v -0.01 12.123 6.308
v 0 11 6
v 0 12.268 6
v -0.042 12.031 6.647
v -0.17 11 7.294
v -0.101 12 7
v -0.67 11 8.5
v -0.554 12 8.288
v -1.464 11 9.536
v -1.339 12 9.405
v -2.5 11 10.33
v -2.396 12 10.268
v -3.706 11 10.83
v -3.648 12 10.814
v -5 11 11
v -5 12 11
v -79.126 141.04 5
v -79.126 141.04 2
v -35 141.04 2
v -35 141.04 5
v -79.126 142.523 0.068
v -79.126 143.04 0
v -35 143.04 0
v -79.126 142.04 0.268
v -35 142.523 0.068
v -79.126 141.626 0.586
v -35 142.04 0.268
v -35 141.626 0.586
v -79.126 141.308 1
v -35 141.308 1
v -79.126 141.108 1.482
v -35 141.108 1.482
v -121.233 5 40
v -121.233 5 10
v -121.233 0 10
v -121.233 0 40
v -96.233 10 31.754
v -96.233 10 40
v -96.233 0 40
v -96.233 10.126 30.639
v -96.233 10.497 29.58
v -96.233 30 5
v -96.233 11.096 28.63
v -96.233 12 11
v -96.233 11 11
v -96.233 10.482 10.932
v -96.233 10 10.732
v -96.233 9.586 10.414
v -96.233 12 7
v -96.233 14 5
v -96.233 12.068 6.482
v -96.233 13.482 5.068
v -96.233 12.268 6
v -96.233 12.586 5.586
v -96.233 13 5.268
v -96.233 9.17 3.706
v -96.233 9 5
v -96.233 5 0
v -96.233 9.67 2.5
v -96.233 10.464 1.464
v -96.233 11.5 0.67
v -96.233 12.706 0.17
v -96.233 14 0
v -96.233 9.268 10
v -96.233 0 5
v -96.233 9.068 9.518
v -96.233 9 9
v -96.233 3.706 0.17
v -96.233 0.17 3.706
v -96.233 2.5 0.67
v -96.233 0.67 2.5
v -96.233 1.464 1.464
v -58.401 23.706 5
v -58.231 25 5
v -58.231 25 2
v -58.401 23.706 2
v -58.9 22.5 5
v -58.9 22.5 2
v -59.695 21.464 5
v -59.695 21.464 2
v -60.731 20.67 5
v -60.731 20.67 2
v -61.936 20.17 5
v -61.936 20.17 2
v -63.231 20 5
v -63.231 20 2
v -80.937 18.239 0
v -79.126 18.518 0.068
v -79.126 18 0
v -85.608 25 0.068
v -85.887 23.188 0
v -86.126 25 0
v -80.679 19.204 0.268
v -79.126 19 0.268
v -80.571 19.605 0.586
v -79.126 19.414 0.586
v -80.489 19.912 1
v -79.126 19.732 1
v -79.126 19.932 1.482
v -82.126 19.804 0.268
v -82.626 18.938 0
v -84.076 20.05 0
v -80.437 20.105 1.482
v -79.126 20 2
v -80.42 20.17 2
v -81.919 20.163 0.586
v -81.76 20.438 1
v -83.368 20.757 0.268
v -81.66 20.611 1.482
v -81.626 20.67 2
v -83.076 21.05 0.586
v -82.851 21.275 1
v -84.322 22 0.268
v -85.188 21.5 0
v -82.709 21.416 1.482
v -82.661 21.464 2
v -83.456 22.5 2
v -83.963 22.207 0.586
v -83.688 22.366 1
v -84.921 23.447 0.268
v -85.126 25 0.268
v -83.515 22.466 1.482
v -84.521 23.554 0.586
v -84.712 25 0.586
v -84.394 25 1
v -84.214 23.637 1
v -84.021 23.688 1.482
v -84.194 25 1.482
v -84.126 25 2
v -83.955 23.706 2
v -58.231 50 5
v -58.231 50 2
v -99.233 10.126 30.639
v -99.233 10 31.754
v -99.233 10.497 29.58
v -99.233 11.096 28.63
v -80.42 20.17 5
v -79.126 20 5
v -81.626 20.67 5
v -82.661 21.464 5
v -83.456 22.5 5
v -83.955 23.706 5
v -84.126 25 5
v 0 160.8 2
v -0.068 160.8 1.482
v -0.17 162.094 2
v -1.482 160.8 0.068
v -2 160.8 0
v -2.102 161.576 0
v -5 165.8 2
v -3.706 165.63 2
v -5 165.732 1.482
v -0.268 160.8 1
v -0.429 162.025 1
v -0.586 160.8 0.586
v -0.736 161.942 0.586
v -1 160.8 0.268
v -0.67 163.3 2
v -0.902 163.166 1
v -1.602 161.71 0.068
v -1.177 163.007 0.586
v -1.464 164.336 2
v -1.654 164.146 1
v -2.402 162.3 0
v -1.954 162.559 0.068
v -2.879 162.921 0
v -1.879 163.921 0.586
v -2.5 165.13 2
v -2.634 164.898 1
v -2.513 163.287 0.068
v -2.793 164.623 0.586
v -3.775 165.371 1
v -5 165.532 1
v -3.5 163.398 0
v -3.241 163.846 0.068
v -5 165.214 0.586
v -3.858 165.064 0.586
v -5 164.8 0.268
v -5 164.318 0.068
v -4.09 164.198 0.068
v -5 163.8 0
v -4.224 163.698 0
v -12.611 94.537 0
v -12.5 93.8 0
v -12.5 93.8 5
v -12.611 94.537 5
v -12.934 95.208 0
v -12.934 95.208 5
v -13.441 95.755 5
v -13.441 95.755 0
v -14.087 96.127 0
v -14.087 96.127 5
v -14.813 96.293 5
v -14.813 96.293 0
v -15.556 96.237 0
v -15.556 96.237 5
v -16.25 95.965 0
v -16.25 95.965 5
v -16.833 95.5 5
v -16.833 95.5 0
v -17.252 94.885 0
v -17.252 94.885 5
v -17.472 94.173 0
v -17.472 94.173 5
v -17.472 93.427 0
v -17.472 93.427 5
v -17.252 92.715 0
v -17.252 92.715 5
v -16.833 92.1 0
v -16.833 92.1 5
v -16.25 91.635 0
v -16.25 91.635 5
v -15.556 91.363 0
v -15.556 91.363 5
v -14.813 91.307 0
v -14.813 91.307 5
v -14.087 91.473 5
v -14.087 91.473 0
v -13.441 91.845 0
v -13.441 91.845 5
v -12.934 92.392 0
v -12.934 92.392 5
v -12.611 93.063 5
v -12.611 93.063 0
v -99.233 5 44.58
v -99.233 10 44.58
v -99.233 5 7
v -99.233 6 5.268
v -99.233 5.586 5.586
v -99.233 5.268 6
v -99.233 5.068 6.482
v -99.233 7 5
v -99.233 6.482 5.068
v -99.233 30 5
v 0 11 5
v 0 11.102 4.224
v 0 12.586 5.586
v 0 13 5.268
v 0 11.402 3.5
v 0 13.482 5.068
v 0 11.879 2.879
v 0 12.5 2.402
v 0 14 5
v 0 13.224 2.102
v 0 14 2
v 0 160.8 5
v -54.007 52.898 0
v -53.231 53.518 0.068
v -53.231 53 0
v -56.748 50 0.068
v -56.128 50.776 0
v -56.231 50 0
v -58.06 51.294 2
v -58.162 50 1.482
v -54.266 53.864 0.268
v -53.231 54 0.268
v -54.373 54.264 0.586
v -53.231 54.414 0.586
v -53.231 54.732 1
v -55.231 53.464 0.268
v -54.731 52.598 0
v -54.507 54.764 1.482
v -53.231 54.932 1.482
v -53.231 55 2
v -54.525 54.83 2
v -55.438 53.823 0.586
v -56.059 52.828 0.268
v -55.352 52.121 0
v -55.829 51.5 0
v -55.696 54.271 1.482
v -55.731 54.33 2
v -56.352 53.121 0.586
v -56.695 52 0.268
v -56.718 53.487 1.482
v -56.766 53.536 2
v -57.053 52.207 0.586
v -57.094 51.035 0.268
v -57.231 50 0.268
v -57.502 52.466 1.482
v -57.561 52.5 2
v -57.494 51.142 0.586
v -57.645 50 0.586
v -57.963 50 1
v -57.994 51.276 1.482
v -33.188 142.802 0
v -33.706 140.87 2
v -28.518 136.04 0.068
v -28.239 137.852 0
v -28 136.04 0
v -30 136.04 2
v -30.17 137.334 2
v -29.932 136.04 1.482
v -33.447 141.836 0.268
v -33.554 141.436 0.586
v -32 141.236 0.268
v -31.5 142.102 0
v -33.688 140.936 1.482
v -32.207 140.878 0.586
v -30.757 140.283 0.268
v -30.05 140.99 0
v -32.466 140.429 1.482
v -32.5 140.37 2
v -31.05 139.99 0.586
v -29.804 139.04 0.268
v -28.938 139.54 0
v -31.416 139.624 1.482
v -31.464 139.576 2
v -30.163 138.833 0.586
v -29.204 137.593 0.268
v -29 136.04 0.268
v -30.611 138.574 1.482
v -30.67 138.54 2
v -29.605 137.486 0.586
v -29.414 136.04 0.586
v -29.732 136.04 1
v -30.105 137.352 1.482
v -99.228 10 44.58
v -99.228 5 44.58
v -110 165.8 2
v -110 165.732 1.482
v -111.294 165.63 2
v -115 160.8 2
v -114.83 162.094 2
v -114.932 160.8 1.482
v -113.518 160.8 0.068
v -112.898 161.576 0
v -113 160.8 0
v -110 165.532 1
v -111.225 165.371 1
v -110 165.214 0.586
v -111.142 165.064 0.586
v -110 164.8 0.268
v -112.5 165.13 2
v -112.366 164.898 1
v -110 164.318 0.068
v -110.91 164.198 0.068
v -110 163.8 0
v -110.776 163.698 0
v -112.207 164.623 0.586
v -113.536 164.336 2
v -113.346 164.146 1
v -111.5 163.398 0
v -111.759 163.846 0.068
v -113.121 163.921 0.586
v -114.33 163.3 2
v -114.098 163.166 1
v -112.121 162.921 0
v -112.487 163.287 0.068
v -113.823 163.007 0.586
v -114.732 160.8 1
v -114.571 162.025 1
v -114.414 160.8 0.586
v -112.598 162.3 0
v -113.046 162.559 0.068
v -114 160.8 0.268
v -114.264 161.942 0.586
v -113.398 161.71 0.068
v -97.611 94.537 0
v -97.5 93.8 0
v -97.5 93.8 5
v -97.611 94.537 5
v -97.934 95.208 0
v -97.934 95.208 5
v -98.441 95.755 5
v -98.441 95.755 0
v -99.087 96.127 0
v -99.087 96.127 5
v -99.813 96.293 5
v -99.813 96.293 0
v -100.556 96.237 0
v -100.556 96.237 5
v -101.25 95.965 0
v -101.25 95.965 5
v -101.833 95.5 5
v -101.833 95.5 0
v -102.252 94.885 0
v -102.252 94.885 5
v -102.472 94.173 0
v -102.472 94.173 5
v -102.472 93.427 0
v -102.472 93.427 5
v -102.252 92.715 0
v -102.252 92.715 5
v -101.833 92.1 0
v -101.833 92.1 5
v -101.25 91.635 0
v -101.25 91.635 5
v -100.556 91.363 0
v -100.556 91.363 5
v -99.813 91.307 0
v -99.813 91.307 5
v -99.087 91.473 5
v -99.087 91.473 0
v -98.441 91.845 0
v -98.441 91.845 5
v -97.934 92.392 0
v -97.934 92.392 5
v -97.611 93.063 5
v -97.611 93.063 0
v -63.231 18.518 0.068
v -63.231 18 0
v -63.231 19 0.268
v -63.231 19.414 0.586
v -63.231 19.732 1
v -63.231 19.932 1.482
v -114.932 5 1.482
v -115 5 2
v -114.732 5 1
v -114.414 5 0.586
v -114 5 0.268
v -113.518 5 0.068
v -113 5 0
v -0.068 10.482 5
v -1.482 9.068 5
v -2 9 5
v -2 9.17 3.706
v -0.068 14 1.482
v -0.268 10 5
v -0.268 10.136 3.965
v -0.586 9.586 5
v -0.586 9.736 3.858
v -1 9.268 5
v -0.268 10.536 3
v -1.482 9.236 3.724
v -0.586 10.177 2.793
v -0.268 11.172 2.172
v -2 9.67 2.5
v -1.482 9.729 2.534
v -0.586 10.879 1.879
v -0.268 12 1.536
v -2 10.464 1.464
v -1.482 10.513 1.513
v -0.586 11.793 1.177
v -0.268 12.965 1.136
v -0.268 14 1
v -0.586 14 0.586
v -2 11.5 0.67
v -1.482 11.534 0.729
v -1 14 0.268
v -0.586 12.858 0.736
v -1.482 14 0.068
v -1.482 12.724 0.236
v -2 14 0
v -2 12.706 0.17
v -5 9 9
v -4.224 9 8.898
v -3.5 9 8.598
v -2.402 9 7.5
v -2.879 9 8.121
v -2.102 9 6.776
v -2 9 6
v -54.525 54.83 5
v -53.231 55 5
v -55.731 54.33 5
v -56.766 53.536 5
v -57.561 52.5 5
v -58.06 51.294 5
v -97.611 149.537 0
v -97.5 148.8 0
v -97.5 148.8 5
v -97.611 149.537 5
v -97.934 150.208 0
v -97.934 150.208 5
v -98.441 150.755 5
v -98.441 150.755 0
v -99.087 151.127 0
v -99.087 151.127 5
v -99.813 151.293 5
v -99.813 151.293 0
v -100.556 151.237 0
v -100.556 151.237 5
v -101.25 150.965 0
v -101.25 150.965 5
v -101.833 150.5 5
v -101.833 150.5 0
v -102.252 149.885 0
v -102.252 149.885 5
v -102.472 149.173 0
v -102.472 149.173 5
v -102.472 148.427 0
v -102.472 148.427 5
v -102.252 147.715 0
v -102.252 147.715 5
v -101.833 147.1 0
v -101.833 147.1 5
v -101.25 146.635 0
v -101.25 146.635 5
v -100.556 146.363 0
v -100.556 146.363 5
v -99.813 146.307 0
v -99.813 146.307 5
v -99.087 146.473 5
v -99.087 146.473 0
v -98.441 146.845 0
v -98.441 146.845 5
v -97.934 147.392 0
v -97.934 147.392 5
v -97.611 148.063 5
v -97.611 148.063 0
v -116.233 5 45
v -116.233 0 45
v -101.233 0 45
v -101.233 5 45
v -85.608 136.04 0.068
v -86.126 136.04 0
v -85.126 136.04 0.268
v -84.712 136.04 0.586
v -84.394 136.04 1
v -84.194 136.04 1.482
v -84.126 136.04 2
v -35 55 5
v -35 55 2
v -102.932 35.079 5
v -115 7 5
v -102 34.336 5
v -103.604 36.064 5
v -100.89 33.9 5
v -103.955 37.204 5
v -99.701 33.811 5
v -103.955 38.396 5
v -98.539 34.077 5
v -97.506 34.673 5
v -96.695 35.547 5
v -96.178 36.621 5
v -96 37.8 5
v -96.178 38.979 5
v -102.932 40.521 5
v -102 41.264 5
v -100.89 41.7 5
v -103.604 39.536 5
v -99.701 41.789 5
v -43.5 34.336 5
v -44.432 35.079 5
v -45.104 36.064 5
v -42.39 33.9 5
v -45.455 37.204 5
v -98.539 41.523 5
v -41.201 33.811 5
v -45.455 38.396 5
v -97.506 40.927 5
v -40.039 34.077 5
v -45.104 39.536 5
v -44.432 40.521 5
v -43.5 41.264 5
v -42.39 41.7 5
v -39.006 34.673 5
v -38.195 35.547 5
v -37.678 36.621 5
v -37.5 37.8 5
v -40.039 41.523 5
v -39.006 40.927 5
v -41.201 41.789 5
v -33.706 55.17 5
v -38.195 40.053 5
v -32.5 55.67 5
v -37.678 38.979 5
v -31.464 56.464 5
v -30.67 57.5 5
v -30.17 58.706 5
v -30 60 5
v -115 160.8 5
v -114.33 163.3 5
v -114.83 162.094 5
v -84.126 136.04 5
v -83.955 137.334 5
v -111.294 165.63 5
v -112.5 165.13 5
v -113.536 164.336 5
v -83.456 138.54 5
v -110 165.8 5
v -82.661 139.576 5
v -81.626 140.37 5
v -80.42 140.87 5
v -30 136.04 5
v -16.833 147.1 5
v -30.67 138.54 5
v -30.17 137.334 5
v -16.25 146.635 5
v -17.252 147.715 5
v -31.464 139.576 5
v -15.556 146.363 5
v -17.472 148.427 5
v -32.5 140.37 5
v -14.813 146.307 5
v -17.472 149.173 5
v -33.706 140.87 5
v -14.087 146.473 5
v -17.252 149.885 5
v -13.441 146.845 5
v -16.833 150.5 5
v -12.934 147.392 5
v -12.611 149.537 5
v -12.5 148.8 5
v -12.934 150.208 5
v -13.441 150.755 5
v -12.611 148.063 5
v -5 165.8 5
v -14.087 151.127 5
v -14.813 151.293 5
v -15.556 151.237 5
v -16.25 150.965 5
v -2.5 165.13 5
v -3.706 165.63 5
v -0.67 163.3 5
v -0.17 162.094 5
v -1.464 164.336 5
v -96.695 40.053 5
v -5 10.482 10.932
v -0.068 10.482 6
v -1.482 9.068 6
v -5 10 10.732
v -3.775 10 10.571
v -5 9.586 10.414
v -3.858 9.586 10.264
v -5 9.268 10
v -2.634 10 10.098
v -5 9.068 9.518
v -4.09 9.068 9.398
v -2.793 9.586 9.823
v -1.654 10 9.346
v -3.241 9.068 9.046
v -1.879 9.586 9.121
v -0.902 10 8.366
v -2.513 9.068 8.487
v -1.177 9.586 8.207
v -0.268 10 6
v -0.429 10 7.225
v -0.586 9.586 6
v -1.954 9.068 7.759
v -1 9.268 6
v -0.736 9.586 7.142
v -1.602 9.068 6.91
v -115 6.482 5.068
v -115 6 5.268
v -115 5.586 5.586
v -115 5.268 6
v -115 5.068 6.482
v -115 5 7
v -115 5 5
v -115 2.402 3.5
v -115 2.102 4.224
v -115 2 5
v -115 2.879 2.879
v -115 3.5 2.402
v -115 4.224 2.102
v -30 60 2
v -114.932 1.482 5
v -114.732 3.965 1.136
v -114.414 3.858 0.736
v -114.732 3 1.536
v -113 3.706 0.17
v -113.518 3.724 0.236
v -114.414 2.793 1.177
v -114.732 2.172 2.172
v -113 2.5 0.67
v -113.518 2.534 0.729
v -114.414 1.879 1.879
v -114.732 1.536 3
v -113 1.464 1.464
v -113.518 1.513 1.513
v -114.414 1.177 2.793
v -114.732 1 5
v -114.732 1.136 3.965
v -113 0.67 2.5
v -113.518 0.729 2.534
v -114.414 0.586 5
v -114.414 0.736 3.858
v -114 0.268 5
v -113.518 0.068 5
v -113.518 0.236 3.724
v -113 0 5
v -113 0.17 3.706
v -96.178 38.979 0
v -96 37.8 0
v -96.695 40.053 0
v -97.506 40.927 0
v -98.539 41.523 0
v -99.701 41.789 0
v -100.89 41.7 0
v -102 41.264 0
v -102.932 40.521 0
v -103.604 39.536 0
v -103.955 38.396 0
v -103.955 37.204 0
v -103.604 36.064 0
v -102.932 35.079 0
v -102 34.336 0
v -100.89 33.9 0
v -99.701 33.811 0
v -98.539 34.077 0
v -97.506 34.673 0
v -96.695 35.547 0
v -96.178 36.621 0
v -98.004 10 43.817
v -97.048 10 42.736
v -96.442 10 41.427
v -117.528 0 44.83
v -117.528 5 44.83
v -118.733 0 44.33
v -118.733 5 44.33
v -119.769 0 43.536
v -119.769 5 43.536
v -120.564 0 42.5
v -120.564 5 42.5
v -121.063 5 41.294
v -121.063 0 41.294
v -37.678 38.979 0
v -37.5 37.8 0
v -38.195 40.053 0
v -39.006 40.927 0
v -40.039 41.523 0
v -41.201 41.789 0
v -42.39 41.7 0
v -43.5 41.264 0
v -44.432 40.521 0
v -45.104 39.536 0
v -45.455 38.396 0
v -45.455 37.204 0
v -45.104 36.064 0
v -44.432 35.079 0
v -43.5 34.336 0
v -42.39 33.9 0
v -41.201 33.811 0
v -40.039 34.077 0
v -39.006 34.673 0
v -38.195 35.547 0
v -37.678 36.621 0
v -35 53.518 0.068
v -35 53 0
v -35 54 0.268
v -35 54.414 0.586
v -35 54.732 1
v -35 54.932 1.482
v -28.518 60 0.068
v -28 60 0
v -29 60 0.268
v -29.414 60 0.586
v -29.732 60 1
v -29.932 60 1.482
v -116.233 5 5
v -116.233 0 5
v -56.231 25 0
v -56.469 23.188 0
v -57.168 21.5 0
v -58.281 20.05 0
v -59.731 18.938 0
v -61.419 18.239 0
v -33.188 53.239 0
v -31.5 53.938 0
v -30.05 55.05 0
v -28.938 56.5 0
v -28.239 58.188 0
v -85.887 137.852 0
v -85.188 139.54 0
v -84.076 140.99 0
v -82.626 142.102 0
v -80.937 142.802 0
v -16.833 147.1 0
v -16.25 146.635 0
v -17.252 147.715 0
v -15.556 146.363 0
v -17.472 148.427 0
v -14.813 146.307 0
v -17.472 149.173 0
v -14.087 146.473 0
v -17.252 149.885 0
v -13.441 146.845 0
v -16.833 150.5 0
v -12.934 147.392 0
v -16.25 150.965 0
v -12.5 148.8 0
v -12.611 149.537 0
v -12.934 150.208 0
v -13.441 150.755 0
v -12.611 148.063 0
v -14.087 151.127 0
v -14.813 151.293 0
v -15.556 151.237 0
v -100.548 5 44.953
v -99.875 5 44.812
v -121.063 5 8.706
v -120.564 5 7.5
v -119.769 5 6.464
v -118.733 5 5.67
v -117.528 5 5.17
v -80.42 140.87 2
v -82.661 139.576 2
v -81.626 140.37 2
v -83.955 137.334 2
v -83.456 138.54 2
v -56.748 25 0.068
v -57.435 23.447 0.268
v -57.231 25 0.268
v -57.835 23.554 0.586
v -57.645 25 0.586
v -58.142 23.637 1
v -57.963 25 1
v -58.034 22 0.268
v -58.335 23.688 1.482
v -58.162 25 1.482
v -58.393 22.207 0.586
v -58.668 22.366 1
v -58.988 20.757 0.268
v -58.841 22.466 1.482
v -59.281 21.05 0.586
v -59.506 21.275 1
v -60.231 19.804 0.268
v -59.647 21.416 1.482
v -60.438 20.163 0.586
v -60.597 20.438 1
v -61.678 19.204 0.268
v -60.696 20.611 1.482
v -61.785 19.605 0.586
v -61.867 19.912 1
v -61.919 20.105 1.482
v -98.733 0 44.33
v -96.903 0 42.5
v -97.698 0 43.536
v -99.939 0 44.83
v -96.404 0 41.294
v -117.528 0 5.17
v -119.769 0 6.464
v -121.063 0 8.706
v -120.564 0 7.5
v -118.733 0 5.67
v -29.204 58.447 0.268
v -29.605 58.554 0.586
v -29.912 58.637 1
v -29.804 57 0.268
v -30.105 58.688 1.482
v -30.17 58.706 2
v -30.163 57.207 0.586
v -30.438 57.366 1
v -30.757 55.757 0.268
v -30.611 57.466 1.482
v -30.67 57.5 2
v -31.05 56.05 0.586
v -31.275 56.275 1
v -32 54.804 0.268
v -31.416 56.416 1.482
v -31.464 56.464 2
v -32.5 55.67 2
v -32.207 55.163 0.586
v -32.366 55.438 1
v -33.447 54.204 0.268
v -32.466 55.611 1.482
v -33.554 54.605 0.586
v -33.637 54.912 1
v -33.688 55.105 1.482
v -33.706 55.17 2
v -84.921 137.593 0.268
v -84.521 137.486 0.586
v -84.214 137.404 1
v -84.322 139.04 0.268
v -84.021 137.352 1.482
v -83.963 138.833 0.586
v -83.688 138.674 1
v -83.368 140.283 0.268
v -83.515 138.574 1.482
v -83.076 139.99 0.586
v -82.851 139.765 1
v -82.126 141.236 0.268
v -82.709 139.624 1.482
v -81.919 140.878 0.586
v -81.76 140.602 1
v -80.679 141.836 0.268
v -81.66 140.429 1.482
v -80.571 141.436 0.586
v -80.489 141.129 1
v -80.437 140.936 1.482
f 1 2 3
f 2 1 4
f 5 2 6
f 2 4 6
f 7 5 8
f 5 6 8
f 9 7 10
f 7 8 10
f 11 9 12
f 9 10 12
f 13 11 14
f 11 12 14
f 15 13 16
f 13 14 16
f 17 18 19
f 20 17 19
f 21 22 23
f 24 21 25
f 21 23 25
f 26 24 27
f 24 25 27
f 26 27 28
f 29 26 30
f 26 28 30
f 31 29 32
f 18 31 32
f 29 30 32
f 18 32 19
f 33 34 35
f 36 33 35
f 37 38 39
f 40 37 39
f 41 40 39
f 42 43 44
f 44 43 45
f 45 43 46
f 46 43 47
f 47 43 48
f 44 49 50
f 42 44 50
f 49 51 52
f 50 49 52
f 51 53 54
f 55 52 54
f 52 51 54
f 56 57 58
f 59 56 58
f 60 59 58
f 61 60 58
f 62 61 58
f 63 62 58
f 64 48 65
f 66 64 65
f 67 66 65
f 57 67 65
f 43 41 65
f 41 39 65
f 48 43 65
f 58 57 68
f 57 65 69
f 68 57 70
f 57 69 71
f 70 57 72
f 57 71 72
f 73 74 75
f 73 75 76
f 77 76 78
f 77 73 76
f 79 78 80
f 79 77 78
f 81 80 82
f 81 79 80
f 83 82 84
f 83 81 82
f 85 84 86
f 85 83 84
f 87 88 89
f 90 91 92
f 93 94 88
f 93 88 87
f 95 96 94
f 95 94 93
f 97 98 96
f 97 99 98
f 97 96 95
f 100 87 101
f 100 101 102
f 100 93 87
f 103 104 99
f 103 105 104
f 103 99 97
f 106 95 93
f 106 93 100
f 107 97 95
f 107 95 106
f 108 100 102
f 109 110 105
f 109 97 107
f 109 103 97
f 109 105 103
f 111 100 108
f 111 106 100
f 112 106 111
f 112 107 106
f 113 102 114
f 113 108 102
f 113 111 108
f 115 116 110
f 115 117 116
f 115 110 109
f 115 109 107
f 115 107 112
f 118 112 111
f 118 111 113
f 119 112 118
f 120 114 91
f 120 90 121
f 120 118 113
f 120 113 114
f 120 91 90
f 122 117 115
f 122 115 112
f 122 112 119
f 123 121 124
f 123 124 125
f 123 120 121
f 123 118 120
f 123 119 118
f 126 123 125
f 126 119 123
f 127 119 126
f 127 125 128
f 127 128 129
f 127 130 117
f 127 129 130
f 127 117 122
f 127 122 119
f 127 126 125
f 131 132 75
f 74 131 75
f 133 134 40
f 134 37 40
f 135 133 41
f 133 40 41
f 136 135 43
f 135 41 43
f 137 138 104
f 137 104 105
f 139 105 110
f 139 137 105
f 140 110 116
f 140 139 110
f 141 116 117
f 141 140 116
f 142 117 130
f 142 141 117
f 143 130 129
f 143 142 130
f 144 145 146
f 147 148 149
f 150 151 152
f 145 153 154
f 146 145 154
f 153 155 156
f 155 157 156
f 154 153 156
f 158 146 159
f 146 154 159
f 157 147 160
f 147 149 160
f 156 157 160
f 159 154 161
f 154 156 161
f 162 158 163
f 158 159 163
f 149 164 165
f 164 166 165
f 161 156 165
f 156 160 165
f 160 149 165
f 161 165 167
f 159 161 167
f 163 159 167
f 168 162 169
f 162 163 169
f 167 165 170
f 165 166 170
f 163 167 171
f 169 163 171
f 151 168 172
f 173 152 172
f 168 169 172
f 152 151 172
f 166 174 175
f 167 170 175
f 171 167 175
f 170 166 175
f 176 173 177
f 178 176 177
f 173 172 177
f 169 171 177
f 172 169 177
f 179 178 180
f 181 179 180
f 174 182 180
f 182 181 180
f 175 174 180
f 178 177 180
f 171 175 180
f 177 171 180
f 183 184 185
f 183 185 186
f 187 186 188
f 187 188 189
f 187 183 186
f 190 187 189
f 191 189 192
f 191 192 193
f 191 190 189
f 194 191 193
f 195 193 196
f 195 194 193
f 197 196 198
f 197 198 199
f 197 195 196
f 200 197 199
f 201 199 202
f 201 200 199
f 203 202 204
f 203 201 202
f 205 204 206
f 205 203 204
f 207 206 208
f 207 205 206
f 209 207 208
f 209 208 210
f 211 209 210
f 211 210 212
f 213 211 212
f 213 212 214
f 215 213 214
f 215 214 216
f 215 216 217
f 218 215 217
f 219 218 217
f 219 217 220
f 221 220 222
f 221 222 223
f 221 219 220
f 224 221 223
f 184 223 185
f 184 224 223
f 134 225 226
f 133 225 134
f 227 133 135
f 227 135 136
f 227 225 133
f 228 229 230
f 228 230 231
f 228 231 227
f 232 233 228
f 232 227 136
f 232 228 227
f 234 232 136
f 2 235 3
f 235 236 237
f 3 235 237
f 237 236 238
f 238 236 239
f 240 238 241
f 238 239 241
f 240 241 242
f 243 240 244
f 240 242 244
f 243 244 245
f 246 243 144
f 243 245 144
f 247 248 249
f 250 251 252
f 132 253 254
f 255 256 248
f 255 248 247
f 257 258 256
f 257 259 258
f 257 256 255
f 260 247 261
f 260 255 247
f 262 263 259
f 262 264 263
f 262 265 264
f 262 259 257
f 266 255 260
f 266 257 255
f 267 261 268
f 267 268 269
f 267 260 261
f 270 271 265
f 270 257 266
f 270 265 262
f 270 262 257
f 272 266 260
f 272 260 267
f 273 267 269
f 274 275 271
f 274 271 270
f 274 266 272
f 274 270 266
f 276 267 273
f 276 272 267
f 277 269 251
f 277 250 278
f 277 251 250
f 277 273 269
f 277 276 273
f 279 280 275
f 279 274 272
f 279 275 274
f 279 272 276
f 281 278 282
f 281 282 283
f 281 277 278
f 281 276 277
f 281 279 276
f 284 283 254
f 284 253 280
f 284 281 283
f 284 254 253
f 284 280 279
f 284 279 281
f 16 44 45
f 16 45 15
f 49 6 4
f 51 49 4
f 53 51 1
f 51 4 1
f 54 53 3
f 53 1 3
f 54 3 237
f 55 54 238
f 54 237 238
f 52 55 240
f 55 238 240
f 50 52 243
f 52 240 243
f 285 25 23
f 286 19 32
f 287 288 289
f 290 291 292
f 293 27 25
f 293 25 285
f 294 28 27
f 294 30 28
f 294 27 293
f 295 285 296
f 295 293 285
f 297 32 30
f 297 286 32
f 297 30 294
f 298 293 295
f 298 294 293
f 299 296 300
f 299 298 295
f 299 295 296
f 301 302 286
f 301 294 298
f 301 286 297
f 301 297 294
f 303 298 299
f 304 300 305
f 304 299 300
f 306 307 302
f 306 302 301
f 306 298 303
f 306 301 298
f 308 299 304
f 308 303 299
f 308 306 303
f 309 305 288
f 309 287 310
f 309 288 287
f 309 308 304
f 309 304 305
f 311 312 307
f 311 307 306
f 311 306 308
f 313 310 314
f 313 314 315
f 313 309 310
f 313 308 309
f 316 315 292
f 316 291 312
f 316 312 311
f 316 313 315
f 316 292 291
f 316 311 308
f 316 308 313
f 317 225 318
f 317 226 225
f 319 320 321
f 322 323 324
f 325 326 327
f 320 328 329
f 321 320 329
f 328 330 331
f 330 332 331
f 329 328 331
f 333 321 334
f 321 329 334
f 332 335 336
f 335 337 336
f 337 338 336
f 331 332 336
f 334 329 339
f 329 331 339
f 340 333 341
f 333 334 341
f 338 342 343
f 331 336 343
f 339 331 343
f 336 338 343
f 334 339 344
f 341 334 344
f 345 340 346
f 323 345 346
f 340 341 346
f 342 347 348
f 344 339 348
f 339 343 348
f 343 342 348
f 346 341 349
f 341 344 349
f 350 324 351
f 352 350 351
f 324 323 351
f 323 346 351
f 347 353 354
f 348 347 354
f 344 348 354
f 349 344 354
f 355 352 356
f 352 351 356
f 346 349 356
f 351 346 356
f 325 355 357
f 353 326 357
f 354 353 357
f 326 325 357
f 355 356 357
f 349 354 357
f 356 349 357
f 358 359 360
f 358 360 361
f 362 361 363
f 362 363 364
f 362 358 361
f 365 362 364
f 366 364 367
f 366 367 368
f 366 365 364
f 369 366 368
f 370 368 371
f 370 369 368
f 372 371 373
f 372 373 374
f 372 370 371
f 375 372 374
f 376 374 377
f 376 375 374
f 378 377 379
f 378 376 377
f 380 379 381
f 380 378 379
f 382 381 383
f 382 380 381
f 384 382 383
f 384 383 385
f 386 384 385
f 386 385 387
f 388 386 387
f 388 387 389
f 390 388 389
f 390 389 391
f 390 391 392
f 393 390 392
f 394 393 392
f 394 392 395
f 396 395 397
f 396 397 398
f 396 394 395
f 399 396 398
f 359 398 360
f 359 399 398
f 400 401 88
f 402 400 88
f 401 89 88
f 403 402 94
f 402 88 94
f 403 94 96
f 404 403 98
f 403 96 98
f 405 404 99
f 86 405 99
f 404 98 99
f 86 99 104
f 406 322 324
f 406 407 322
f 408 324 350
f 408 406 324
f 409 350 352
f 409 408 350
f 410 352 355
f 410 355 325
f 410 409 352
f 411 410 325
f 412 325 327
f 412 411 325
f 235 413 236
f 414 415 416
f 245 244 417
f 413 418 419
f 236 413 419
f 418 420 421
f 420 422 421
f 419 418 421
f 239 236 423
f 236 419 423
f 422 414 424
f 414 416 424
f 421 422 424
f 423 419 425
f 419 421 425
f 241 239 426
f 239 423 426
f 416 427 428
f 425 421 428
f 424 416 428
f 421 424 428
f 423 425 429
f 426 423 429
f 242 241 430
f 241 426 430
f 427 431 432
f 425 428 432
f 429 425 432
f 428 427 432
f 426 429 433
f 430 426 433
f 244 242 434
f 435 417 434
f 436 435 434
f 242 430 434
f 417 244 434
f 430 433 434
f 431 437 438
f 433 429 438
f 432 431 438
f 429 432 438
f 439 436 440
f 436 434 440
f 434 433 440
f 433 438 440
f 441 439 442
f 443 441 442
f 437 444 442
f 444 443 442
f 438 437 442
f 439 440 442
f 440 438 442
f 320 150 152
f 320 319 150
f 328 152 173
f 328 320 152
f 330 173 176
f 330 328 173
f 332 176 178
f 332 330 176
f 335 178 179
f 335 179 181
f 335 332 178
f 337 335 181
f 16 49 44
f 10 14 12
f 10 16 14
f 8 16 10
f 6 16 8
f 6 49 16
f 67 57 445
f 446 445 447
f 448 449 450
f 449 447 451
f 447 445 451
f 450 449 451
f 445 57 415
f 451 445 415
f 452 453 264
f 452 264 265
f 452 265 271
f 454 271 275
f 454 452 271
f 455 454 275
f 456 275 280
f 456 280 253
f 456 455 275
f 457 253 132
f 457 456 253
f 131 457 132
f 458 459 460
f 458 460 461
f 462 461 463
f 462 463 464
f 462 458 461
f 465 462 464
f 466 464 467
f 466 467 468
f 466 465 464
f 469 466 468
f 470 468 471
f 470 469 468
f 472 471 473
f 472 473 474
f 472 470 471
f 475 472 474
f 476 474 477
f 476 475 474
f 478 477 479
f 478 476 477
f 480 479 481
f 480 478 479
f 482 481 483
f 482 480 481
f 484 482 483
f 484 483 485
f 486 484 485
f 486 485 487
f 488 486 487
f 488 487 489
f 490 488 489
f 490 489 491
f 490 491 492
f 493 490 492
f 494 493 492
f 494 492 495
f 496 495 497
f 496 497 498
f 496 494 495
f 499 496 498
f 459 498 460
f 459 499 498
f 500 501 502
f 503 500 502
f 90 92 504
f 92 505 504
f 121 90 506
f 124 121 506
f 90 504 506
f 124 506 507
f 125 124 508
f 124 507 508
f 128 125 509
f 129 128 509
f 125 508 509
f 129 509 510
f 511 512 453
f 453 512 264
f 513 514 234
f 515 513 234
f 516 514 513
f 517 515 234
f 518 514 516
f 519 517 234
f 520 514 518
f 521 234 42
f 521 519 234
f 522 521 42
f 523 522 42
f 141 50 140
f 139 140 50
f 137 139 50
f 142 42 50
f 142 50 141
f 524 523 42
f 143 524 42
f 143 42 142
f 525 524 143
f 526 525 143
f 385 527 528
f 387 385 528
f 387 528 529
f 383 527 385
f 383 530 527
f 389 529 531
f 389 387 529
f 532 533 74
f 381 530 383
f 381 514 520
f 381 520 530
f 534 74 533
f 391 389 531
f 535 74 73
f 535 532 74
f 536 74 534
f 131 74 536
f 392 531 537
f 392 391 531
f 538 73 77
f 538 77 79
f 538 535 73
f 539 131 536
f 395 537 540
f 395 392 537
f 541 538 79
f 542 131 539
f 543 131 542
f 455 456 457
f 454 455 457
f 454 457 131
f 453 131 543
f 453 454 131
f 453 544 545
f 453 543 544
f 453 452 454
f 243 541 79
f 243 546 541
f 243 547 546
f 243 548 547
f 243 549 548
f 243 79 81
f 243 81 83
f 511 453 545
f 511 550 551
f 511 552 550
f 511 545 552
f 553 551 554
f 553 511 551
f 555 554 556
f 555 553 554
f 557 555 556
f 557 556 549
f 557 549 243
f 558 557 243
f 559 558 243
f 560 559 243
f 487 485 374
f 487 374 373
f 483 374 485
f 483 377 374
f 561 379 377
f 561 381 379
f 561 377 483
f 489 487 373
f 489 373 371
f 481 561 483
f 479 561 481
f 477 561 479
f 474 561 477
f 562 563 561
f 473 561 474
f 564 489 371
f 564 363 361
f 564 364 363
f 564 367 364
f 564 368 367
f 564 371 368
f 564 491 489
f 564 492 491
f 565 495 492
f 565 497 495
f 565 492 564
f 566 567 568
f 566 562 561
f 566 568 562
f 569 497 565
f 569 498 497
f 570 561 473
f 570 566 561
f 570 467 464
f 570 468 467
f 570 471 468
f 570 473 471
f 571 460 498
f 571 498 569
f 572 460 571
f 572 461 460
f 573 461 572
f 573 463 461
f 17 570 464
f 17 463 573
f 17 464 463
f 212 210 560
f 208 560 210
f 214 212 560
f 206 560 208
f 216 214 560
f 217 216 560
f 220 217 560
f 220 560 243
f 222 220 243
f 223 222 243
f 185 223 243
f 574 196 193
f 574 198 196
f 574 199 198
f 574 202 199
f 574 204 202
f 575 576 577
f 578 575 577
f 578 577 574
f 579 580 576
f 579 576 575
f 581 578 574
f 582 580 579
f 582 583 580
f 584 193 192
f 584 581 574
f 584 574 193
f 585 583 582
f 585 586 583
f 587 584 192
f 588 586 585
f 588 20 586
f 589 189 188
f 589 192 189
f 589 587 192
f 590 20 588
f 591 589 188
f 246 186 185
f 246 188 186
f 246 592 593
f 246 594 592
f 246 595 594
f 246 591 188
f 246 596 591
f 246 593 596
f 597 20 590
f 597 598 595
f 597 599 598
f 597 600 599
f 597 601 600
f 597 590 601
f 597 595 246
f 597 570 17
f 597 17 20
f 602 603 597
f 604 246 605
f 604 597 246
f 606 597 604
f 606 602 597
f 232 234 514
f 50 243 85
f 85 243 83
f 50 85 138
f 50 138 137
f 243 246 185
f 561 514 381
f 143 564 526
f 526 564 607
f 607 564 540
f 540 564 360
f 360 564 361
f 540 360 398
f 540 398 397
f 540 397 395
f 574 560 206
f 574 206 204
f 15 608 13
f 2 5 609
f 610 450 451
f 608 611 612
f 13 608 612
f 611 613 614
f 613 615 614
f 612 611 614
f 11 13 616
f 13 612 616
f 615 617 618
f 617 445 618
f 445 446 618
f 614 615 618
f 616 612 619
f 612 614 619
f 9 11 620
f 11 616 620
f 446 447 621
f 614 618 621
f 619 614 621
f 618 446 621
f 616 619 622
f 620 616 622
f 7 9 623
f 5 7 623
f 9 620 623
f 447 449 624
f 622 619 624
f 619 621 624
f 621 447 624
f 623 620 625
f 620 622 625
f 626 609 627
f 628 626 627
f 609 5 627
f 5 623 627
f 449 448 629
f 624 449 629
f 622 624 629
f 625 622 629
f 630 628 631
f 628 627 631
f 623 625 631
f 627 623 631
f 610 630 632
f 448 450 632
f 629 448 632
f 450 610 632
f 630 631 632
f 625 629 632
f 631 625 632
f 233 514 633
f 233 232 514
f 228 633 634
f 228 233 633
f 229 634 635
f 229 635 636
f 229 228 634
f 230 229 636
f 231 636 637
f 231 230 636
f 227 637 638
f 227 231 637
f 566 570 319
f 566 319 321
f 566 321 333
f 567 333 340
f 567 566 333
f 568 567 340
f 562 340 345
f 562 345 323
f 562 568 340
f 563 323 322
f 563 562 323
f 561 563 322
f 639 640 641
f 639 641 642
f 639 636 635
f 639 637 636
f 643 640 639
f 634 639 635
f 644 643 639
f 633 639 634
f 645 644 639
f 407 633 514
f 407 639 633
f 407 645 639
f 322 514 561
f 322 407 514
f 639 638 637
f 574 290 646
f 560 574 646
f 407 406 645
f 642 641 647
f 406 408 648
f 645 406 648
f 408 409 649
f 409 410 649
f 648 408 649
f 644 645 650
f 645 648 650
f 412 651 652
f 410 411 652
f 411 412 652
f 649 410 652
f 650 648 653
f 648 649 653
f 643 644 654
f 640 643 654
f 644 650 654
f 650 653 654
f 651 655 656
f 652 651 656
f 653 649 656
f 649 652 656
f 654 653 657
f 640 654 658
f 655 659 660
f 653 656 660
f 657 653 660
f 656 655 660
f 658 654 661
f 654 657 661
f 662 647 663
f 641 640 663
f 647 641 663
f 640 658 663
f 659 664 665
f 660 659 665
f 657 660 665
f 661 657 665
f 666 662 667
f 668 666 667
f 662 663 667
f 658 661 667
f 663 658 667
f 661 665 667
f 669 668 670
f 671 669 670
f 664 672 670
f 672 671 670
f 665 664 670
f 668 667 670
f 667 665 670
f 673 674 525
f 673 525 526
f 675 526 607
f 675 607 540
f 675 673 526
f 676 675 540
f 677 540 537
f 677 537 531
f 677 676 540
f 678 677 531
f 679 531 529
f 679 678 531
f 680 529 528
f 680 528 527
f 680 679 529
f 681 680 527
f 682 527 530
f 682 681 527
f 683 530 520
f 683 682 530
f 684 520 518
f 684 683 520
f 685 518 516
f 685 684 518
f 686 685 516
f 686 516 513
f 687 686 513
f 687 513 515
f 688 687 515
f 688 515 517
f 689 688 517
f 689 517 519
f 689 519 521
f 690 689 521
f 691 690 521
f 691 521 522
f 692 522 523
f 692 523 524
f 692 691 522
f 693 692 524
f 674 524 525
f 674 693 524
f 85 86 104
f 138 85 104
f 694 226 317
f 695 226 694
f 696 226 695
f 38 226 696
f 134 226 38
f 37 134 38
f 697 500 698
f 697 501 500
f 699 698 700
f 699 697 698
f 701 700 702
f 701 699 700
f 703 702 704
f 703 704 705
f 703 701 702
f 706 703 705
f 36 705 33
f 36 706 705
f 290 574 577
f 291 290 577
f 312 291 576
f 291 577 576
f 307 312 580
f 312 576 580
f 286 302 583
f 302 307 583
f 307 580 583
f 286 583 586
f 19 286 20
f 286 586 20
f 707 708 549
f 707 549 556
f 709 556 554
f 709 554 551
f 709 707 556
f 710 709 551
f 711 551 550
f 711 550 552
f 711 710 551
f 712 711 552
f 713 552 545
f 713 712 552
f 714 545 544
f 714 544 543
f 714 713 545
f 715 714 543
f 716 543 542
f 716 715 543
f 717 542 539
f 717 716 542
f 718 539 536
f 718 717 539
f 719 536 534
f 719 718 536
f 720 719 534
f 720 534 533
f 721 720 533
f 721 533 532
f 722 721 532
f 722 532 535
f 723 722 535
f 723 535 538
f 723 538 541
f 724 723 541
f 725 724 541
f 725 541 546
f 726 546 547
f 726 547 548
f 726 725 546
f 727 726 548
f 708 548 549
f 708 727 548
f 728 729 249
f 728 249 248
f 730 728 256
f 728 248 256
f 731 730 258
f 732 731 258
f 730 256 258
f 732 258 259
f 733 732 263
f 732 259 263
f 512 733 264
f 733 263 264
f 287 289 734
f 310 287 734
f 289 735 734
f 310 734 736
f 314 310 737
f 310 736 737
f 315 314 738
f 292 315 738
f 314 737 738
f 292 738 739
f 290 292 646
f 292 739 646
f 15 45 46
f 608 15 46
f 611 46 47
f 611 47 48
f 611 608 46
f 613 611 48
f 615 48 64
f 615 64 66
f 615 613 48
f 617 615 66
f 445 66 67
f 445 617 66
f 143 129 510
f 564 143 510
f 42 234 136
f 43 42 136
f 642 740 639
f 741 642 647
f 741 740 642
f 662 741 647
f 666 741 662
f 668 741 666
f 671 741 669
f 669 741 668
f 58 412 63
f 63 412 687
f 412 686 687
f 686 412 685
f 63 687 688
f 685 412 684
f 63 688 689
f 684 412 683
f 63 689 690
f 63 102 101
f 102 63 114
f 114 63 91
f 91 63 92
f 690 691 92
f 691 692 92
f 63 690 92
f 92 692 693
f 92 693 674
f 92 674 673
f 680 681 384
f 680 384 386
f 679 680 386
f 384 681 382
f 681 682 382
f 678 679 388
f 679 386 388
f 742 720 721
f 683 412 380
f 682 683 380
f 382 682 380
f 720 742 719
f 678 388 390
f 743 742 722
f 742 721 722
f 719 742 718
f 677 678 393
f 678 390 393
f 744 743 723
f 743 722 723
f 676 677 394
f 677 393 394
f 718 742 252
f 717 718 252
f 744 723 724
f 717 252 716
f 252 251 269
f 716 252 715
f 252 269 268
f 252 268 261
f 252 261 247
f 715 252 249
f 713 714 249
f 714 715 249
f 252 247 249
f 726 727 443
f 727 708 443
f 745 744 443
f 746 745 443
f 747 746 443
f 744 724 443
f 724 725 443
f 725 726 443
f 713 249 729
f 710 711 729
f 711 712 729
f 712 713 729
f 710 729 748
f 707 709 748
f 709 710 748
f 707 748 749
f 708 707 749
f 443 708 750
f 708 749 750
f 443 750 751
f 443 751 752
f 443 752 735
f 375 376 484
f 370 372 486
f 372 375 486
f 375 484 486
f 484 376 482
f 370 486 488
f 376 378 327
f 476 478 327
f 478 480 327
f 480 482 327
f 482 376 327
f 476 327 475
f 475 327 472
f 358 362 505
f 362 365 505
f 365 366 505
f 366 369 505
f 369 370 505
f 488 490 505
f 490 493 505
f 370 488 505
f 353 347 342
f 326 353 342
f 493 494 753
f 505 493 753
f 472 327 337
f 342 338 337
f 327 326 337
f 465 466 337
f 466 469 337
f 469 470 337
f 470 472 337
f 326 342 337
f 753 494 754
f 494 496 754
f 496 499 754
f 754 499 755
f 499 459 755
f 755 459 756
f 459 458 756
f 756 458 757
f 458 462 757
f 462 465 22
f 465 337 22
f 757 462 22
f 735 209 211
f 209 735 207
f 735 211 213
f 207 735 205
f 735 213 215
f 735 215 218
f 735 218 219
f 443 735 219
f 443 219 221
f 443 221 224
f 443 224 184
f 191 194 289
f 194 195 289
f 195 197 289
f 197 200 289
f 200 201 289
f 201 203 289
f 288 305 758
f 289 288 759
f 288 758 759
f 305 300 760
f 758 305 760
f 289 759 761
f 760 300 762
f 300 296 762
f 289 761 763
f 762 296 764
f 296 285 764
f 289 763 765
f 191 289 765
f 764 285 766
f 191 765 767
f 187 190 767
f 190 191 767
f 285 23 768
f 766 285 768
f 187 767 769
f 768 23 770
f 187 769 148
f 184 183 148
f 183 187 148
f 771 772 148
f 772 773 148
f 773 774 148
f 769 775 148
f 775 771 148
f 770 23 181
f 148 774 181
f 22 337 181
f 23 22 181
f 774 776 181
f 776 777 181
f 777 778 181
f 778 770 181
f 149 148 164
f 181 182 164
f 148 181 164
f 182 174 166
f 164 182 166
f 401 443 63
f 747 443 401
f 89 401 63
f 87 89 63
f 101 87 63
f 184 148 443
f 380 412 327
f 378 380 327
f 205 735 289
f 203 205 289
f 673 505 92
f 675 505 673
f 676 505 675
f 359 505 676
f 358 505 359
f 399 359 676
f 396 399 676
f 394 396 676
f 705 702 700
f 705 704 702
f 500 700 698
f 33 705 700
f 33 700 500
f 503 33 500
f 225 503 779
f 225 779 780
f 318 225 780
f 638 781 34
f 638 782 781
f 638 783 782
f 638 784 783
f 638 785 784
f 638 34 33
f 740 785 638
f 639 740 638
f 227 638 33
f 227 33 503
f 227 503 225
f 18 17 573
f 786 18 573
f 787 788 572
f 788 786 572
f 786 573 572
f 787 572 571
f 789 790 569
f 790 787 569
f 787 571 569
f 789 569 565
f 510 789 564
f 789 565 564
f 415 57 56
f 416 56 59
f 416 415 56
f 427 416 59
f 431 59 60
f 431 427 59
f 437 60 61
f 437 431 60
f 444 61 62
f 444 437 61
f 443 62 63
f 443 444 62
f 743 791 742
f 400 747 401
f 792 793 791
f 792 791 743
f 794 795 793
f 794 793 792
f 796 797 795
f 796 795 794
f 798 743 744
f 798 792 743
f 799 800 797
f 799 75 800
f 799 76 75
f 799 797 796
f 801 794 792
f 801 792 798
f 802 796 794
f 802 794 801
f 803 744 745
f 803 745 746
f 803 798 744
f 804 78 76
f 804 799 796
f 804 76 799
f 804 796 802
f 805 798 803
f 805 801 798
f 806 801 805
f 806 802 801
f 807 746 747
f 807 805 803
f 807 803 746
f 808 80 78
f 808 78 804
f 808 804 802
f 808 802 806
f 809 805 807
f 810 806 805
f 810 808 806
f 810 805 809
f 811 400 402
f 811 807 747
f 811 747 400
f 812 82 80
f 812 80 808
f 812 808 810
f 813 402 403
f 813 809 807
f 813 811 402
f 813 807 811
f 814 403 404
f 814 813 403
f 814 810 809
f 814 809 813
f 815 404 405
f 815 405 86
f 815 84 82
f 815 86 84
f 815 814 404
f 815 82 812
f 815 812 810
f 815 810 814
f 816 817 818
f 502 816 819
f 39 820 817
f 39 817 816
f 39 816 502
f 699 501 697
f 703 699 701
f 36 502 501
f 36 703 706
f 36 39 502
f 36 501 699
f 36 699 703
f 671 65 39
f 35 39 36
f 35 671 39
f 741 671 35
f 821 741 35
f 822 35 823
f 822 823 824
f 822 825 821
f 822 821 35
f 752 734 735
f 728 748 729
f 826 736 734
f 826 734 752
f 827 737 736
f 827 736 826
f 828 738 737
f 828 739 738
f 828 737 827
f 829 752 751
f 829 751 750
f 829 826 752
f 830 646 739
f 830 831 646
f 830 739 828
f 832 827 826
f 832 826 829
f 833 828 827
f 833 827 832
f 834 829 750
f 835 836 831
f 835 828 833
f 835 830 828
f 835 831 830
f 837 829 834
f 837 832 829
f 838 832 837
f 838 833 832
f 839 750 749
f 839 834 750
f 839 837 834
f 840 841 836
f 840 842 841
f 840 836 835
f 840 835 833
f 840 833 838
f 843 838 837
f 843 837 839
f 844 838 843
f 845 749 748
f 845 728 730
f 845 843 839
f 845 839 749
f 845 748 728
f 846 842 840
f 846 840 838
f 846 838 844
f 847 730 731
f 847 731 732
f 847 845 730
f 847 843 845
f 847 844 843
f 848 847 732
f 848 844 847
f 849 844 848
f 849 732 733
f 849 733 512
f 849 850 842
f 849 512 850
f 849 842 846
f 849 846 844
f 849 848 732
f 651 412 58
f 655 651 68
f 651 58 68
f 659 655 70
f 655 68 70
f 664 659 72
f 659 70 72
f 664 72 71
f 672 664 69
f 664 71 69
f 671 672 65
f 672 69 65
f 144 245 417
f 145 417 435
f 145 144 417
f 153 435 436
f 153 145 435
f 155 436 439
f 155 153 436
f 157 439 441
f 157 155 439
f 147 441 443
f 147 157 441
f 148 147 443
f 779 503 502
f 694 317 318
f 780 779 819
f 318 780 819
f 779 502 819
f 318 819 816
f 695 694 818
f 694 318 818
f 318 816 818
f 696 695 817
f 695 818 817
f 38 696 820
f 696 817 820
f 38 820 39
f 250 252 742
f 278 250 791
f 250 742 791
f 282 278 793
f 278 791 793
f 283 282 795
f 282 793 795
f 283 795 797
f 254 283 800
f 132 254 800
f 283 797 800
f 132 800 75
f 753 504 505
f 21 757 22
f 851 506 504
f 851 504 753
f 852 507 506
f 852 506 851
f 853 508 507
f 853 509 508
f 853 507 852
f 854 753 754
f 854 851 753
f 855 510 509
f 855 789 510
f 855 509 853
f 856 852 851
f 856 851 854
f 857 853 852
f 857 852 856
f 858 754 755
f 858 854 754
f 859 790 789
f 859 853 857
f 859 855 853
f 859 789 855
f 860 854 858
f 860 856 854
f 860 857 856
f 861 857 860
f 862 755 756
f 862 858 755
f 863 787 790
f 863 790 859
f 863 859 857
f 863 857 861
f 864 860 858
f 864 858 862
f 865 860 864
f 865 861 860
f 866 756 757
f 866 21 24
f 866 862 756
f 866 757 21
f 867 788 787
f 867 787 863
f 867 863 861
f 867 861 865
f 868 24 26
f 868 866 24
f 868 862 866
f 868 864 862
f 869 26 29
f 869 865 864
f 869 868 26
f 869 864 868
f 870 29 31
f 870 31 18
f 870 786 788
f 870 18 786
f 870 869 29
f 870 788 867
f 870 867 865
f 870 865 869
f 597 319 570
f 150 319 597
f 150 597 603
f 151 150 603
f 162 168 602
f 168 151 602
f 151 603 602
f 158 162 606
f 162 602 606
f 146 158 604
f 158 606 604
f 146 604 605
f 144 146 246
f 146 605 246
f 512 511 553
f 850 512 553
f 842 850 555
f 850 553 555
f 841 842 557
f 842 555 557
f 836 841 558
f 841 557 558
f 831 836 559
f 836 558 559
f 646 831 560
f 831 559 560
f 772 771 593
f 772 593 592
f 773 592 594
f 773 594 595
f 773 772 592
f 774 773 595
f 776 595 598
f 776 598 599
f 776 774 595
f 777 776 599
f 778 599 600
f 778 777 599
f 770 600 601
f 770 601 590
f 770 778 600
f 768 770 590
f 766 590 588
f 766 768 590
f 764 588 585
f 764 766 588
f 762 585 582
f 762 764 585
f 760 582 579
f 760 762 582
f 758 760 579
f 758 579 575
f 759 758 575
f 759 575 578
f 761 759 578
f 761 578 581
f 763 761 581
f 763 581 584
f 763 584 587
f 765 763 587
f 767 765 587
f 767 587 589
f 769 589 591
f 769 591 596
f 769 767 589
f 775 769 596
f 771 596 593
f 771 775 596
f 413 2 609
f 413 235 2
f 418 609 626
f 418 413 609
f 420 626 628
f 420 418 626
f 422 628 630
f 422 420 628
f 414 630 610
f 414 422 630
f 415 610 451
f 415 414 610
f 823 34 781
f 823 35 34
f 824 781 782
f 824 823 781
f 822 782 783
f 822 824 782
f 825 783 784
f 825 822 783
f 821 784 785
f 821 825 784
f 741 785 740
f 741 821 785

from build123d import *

# Parameters (mm, degrees)
F0_W      = 115
F0_H      = 165.8
F0_R      = 4
F0_R_2    = 2.5
F1_DEPTH  = 5
F2_W      = 18.7665516138
F2_H      = 5
F2_W_2    = 6.2334483862
F3_DEPTH  = 40
F4_W      = 3
F4_H      = 25
F5_DEPTH  = 25
F9_W      = 3
F9_H      = 5
F10_DEPTH = 14.58
F12_DEPTH = 3
F13_W     = 96.2334483862
F13_H     = 9
F14_DEPTH = 5
F15_W     = 96.2334483862
F15_H     = 3
F16_DEPTH = 6
F17_R     = 5
F18_R     = 2


with BuildPart() as f1:
    # F0 (on Top) → F1 (new body)
    with BuildSketch(Plane.XY):
        with Locations((-57.5, 82.9)):
            Rectangle(F0_W, F0_H)
        with Locations((-100, 37.8)):
            Circle(F0_R, mode=Mode.SUBTRACT)
        with Locations((-41.5, 37.8)):
            Circle(F0_R, mode=Mode.SUBTRACT)
        Polygon((-84.125764668, 141.0401467979), (-30, 141.0401467979), (-30, 55), (-58.2305043936, 55), (-58.2305043936, 20), (-84.125764668, 20), align=None, mode=Mode.SUBTRACT)
        with Locations((-100, 93.8)):
            Circle(F0_R_2, mode=Mode.SUBTRACT)
        with Locations((-100, 148.8)):
            Circle(F0_R_2, mode=Mode.SUBTRACT)
        with Locations((-15, 93.8)):
            Circle(F0_R_2, mode=Mode.SUBTRACT)
        with Locations((-15, 148.8)):
            Circle(F0_R_2, mode=Mode.SUBTRACT)
    extrude(amount=-F1_DEPTH)

    # F2 (on face) → F3 (join)
    with BuildSketch(Plane(origin=(0, 0, -5), x_dir=(1, 0, 0), z_dir=(0, 0, -1))):
        with Locations((-105.6167241931, -2.5)):
            Rectangle(F2_W, F2_H)
        with Locations((-118.1167241931, -2.5)):
            Rectangle(F2_W_2, F2_H)
    extrude(amount=F3_DEPTH)

    # F4 (on face) → F5 (join)
    with BuildSketch(Plane(origin=(0, 5, 0), x_dir=(-1, 0, 0), z_dir=(0, 1, 0))):
        with Locations((97.7334483862, -17.5)):
            Rectangle(F4_W, F4_H)
    extrude(amount=F5_DEPTH)


with BuildPart() as f7_1:
    # F7: instance of F1
    add(f1.part.mirror(Plane.XY))

    # F9 (on face) → F10 (join)
    with BuildSketch(Plane.XY.offset(30)):
        with Locations((-97.7334483862, 7.5)):
            Rectangle(F9_W, F9_H)
    extrude(amount=F10_DEPTH)

    # F11 (on face) → F12 (cut, through all)
    with BuildSketch(Plane(origin=(-99.2334483862, 0, 0), x_dir=(0, -1, 0), z_dir=(-1, 0, 0))):
        Polygon((-30, 30), (-30, 5), (-10, 30), align=None)
    extrude(amount=-F12_DEPTH, mode=Mode.SUBTRACT)

    # F13 (on face) → F14 (cut, through all)
    with BuildSketch(Plane.XY.offset(5)):
        with Locations((-48.1167241931, 4.5)):
            Rectangle(F13_W, F13_H)
    extrude(amount=-F14_DEPTH, mode=Mode.SUBTRACT)

    # F15 (on face) → F16 (join)
    with BuildSketch(Plane.XY.offset(5)):
        with Locations((-48.1167241931, 10.5)):
            Rectangle(F15_W, F15_H)
    extrude(amount=F16_DEPTH)

    # F17
    f17_edges = [f7_1.edges().sort_by_distance(p)[0] for p in [
        (-97.733448, 10, 30),
        (-105.616724, 0, 0),
        (-96.233448, 2.5, 45),
        (-121.233448, 2.5, 45),
        (-121.233448, 2.5, 5),
        (-115, 165.8, 2.5),
        (0, 165.8, 2.5),
        (0, 10.5, 11),
        (-58.230504, 55, 2.5),
        (-30, 55, 2.5),
        (-58.230504, 20, 2.5),
        (-84.125765, 20, 2.5),
        (-30, 141.040147, 2.5),
        (-84.125765, 141.040147, 2.5),
        (-48.116724, 9, 0),
    ]]
    fillet(f17_edges, radius=F17_R)

    # F18 (call 1 of 4: OpenCascade refuses the feature's edges together)
    f18_edges = [f7_1.edges().sort_by_distance(p)[0] for p in [
        (-48.116724, 12, 5),
    ]]
    fillet(f18_edges, radius=F18_R)

    # F18#2 (call 2 of 4)
    f18_2_edges = [f7_1.edges().sort_by_distance(p)[0] for p in [
        (-107.116724, 5, 5),
    ]]
    fillet(f18_2_edges, radius=F18_R)

    # F18#3 (call 3 of 4)
    f18_3_edges = [f7_1.edges().sort_by_distance(p)[0] for p in [
        (0, 87.4, 0),
        (-115, 1.464466, 1.464466),
        (-115, 82.9, 0),
        (-113.535534, 164.335534, 0),
        (-57.5, 165.8, 0),
        (-1.464466, 164.335534, 0),
        (-50.616724, 9, 11),
        (0, 9, 5.5),
        (-1.464466, 9, 9.535534),
        (0, 10.464466, 1.464466),
    ]]
    fillet(f18_3_edges, radius=F18_R)

    # F18#4 (call 4 of 4)
    f18_4_edges = [f7_1.edges().sort_by_distance(p)[0] for p in [
        (-30, 98.020073, 0),
        (-57.062882, 141.040147, 0),
        (-82.661299, 139.575681, 0),
        (-31.464466, 139.575681, 0),
        (-84.125765, 80.520073, 0),
        (-82.661299, 21.464466, 0),
        (-31.464466, 56.464466, 0),
        (-71.178135, 20, 0),
        (-44.115252, 55, 0),
        (-59.69497, 21.464466, 0),
        (-56.766038, 53.535534, 0),
        (-58.230504, 37.5, 0),
    ]]
    fillet(f18_4_edges, radius=F18_R)


solid = f7_1.part
